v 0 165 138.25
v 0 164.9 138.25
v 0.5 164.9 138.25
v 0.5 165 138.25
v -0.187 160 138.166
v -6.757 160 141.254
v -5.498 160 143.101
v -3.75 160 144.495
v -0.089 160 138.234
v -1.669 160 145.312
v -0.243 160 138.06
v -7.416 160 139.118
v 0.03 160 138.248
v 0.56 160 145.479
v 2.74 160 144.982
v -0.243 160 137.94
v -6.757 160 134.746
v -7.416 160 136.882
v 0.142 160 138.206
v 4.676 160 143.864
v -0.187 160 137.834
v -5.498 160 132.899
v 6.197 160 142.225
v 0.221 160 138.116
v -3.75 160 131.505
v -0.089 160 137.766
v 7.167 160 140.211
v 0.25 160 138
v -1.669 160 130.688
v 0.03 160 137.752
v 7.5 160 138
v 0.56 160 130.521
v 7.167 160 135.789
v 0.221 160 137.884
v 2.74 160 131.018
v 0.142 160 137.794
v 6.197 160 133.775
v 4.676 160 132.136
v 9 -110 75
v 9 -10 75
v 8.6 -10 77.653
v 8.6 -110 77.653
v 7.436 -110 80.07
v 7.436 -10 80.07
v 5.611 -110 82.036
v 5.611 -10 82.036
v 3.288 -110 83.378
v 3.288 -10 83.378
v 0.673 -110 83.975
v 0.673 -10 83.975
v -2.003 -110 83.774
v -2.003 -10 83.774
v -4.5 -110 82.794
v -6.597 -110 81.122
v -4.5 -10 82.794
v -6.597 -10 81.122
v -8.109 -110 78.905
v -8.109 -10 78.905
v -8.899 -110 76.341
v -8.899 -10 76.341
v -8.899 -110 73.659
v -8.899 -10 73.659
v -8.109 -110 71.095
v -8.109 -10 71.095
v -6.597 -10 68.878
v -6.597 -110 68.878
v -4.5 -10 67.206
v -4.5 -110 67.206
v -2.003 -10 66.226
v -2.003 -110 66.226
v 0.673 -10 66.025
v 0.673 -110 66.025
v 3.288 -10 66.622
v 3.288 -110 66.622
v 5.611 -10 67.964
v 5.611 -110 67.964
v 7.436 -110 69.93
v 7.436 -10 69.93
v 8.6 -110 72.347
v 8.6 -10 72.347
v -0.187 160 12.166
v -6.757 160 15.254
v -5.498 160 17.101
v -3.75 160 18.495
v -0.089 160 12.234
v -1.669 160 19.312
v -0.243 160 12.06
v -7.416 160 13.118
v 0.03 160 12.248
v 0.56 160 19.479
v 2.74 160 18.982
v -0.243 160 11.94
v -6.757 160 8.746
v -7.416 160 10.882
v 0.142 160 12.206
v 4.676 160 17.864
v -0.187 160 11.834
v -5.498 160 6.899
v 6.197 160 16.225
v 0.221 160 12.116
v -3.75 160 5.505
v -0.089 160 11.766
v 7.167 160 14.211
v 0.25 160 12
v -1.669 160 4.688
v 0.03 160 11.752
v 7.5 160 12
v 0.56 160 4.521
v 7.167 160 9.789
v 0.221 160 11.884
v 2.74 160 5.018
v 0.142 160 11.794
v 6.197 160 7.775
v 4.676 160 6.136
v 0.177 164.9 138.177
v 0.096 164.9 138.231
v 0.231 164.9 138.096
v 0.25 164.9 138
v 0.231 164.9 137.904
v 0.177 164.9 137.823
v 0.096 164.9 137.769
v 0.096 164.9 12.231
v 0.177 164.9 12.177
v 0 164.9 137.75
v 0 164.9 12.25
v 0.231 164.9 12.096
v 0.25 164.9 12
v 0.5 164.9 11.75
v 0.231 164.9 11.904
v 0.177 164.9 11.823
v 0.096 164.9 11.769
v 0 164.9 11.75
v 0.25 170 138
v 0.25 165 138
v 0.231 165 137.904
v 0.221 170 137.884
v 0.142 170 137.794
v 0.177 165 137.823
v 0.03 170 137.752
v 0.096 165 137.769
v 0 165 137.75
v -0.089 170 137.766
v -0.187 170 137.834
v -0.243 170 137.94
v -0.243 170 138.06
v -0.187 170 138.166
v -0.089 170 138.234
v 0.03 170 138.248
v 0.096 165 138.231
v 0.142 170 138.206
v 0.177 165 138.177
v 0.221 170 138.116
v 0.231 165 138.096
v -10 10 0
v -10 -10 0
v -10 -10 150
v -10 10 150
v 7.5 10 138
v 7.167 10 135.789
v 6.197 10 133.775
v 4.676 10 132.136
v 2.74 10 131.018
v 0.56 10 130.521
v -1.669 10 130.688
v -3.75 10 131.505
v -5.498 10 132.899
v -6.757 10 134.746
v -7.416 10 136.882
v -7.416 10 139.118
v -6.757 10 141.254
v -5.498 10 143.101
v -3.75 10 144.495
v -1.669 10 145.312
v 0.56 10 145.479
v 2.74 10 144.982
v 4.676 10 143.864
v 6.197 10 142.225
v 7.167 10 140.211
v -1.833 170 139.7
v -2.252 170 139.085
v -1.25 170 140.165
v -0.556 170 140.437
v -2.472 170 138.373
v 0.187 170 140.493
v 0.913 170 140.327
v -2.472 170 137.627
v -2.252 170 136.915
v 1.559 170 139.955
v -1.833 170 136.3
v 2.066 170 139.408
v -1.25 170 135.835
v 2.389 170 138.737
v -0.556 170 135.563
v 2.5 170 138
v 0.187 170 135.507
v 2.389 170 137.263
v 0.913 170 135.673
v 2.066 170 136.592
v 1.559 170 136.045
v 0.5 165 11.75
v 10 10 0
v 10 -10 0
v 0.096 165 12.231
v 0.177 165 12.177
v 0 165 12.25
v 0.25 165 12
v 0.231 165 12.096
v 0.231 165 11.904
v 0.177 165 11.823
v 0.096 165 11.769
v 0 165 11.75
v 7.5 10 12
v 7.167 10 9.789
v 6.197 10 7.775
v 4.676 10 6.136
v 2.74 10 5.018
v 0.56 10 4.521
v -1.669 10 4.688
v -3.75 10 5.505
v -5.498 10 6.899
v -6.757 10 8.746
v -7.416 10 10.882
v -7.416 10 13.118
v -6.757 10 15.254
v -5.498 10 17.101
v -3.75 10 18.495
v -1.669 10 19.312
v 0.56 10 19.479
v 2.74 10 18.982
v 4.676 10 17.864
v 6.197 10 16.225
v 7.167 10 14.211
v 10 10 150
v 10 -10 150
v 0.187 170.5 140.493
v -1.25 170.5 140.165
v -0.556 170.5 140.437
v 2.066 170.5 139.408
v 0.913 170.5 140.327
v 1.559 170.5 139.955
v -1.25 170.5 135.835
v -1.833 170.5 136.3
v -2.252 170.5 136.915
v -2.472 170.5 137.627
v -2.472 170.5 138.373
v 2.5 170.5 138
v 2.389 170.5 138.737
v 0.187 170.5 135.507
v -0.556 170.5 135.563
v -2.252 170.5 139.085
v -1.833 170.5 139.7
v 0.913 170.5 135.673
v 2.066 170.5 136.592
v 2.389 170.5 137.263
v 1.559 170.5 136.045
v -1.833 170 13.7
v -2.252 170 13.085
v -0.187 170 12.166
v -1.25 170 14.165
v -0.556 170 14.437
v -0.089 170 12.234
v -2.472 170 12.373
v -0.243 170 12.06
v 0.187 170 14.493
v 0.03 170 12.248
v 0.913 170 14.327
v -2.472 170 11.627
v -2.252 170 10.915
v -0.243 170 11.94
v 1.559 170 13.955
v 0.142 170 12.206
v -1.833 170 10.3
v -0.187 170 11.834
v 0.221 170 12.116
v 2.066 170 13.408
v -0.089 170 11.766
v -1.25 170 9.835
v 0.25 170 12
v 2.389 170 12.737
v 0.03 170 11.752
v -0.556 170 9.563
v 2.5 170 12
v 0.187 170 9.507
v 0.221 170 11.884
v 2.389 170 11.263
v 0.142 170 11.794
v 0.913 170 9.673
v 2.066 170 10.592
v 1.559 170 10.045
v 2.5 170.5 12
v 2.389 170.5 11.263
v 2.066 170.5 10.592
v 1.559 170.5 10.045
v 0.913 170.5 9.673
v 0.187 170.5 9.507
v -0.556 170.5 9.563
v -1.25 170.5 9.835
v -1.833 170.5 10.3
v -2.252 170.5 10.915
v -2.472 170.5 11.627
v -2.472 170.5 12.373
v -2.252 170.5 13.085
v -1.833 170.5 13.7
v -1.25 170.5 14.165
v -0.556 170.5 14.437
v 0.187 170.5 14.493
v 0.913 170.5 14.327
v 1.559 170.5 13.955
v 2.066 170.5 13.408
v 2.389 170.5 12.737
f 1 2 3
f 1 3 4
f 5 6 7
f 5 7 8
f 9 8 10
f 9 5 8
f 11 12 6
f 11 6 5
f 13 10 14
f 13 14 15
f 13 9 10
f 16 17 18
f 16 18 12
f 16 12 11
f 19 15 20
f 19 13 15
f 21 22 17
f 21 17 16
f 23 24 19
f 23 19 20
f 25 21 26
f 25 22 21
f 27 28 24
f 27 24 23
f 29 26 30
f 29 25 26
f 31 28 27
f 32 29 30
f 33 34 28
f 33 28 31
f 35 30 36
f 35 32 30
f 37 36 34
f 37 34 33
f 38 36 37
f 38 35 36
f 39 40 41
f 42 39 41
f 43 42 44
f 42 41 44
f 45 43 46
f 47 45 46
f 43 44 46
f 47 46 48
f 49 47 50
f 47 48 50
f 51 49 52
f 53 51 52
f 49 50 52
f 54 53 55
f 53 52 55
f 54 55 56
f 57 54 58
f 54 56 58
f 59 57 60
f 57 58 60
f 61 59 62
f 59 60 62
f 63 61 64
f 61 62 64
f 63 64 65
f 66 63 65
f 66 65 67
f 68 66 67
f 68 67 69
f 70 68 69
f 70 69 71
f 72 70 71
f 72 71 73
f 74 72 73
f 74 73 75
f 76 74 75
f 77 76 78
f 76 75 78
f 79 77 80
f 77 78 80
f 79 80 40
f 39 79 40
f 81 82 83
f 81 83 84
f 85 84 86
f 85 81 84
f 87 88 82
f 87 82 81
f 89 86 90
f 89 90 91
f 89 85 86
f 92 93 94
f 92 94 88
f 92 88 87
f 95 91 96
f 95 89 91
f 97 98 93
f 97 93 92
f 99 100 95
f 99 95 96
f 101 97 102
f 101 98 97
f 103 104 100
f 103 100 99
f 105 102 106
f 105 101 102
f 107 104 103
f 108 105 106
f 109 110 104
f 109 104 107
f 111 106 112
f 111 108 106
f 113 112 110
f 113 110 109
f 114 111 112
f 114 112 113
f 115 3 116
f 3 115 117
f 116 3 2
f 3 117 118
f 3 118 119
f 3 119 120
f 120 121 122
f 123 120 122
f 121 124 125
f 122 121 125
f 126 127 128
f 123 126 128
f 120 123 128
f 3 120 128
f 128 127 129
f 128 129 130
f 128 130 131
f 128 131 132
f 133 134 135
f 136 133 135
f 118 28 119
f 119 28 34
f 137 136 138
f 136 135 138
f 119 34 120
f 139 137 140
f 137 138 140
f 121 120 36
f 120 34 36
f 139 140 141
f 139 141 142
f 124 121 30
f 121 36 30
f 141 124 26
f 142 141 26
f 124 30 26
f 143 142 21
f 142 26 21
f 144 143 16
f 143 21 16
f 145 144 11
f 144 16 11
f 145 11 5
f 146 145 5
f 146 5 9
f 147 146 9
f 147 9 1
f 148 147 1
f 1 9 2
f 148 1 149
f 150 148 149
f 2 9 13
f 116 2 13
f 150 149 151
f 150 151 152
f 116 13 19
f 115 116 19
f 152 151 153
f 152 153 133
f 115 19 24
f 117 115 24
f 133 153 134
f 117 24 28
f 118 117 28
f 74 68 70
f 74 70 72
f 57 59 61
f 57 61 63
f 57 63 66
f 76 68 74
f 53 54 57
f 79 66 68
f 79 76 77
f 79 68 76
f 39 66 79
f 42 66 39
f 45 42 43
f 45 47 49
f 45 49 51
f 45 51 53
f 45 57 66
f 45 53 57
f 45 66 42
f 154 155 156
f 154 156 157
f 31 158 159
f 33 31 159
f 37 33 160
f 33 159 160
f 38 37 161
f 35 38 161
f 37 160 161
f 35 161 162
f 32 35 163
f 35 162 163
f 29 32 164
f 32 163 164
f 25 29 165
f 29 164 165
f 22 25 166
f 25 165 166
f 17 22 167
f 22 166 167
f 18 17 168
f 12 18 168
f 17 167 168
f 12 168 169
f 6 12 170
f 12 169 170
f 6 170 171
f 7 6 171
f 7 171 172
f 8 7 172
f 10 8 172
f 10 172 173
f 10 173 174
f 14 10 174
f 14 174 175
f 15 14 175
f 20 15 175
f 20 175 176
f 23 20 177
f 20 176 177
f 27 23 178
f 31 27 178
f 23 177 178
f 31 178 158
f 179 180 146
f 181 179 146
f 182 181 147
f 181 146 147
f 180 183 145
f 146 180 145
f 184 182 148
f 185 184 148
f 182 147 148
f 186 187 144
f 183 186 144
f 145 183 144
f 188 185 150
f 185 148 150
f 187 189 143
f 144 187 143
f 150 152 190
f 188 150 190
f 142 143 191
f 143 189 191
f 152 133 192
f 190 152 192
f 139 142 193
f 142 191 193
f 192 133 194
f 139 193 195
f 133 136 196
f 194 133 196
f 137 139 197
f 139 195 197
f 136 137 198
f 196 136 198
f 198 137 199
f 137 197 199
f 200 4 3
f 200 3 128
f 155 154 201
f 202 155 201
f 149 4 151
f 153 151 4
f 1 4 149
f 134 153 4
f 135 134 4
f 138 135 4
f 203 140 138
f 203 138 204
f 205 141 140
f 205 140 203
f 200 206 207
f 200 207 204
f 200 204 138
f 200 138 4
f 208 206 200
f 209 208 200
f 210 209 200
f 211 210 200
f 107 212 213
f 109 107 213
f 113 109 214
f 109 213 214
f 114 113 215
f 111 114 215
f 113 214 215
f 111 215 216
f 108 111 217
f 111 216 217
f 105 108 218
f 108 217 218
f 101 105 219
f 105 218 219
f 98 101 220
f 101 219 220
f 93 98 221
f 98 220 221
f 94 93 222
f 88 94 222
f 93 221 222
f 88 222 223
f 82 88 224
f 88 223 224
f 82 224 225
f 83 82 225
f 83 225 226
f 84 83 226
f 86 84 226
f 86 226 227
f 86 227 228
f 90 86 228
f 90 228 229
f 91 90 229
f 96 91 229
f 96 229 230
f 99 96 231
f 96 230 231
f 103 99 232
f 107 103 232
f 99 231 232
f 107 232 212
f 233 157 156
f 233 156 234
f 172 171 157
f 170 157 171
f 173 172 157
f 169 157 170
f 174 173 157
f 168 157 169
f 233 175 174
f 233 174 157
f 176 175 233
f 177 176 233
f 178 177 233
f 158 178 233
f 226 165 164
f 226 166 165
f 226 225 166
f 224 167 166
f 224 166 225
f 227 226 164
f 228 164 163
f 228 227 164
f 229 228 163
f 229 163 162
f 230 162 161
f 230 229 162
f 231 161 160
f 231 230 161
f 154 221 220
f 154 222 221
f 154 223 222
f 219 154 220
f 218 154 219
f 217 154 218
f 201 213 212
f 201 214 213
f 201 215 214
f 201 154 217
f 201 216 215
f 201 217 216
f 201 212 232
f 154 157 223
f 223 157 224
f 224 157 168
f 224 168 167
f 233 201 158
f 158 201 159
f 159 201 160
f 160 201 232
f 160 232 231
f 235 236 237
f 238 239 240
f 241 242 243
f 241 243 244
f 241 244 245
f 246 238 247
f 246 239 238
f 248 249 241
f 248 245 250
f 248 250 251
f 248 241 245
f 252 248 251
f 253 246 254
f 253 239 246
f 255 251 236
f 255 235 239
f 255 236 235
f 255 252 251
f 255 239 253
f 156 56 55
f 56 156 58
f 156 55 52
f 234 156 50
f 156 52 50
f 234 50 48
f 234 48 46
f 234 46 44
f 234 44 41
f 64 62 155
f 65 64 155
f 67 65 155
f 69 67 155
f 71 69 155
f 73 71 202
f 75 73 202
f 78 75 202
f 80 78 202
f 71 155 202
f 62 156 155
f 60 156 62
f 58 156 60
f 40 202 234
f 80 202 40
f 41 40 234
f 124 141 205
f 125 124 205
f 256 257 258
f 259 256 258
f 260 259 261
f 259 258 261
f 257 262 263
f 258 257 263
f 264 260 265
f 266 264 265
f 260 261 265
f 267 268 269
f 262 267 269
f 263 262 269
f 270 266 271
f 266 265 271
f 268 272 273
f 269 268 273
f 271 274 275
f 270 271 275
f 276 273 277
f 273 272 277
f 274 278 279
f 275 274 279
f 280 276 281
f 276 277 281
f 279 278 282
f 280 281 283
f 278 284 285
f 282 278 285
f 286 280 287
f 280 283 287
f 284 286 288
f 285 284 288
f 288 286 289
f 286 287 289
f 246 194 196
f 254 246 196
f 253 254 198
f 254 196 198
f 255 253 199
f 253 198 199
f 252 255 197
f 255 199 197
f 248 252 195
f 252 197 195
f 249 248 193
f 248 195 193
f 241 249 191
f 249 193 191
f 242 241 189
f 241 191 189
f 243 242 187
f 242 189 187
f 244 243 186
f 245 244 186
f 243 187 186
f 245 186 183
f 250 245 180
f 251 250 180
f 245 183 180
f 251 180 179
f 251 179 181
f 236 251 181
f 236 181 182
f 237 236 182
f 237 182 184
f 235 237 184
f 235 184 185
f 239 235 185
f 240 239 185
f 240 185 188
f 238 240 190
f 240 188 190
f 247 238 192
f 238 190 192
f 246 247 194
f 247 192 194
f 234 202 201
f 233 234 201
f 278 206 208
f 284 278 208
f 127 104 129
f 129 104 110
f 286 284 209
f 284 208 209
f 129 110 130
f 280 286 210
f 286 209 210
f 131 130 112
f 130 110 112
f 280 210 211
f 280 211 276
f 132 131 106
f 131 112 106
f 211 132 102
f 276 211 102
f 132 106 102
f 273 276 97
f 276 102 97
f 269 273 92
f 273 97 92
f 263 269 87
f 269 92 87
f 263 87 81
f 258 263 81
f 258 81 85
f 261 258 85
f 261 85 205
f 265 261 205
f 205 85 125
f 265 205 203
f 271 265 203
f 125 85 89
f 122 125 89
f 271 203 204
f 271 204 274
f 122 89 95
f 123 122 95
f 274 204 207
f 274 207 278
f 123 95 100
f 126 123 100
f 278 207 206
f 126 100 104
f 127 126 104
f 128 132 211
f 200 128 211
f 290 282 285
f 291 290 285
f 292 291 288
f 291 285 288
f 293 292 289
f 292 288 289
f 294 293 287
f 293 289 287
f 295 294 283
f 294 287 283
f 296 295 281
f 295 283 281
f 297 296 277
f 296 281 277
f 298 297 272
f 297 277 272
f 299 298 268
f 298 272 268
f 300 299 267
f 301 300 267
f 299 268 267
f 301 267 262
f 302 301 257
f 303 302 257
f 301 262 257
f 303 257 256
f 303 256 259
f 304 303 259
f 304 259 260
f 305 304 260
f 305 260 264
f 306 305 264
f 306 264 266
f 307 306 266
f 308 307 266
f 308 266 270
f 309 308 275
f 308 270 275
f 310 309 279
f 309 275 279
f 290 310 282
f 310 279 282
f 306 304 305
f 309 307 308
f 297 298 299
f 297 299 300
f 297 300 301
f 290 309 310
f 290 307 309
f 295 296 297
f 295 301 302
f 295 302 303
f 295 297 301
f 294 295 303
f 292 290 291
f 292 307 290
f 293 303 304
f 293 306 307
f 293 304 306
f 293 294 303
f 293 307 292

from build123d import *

# Parameters (mm, degrees)
SKETCH1_W           = 20
SKETCH1_H           = 20
BOSS_EXTRUDE1_DEPTH = 150
SKETCH3_R           = 9
BOSS_EXTRUDE2_DEPTH = 100
SKETCH2_R           = 7.5
BOSS_EXTRUDE3_DEPTH = 150
SKETCH7_R           = 0.25
BOSS_EXTRUDE4_DEPTH = 10
SKETCH8_R           = 2.5
BOSS_EXTRUDE5_DEPTH = 0.5
SKETCH19_W          = 126.5
SKETCH19_H          = 0.1
BOSS_EXTRUDE6_DEPTH = 0.5


with BuildPart() as part:
    # Sketch1 → Boss-Extrude1 (new body)
    with BuildSketch(Plane.XY):
        Rectangle(SKETCH1_W, SKETCH1_H)
    extrude(amount=BOSS_EXTRUDE1_DEPTH)

    # Sketch3 → Boss-Extrude2 (add)
    with BuildSketch(Plane.XZ.offset(10)):
        with Locations((0, 75)):
            Circle(SKETCH3_R)
    extrude(amount=BOSS_EXTRUDE2_DEPTH)

    # Sketch2 → Boss-Extrude3 (add)
    with BuildSketch(Plane(origin=(0, 10, 0), x_dir=(1, 0, 0), z_dir=(0, 1, 0))):
        with Locations((0, -12)):
            Circle(SKETCH2_R)
        with Locations((0, -138)):
            Circle(SKETCH2_R)
    extrude(amount=BOSS_EXTRUDE3_DEPTH)

    # Sketch7 → Boss-Extrude4 (add)
    with BuildSketch(Plane(origin=(0, 160, 0), x_dir=(1, 0, 0), z_dir=(0, 1, 0))):
        with Locations((0, -12)):
            Circle(SKETCH7_R)
        with Locations((0, -138)):
            Circle(SKETCH7_R)
    extrude(amount=BOSS_EXTRUDE4_DEPTH)

    # Sketch8 → Boss-Extrude5 (add)
    with BuildSketch(Plane(origin=(0, 170, 0), x_dir=(1, 0, 0), z_dir=(0, 1, 0))):
        with Locations((0, -12)):
            Circle(SKETCH8_R)
        with Locations((0, -138)):
            Circle(SKETCH8_R)
    extrude(amount=BOSS_EXTRUDE5_DEPTH)

    # Sketch19 → Boss-Extrude6 (add)
    with BuildSketch(Plane(origin=(0, 0, 0), x_dir=(0, 0, -1), z_dir=(1, 0, 0))):
        with Locations((-75, 164.95)):
            Rectangle(SKETCH19_W, SKETCH19_H)
    extrude(amount=BOSS_EXTRUDE6_DEPTH)


solid = part.part
